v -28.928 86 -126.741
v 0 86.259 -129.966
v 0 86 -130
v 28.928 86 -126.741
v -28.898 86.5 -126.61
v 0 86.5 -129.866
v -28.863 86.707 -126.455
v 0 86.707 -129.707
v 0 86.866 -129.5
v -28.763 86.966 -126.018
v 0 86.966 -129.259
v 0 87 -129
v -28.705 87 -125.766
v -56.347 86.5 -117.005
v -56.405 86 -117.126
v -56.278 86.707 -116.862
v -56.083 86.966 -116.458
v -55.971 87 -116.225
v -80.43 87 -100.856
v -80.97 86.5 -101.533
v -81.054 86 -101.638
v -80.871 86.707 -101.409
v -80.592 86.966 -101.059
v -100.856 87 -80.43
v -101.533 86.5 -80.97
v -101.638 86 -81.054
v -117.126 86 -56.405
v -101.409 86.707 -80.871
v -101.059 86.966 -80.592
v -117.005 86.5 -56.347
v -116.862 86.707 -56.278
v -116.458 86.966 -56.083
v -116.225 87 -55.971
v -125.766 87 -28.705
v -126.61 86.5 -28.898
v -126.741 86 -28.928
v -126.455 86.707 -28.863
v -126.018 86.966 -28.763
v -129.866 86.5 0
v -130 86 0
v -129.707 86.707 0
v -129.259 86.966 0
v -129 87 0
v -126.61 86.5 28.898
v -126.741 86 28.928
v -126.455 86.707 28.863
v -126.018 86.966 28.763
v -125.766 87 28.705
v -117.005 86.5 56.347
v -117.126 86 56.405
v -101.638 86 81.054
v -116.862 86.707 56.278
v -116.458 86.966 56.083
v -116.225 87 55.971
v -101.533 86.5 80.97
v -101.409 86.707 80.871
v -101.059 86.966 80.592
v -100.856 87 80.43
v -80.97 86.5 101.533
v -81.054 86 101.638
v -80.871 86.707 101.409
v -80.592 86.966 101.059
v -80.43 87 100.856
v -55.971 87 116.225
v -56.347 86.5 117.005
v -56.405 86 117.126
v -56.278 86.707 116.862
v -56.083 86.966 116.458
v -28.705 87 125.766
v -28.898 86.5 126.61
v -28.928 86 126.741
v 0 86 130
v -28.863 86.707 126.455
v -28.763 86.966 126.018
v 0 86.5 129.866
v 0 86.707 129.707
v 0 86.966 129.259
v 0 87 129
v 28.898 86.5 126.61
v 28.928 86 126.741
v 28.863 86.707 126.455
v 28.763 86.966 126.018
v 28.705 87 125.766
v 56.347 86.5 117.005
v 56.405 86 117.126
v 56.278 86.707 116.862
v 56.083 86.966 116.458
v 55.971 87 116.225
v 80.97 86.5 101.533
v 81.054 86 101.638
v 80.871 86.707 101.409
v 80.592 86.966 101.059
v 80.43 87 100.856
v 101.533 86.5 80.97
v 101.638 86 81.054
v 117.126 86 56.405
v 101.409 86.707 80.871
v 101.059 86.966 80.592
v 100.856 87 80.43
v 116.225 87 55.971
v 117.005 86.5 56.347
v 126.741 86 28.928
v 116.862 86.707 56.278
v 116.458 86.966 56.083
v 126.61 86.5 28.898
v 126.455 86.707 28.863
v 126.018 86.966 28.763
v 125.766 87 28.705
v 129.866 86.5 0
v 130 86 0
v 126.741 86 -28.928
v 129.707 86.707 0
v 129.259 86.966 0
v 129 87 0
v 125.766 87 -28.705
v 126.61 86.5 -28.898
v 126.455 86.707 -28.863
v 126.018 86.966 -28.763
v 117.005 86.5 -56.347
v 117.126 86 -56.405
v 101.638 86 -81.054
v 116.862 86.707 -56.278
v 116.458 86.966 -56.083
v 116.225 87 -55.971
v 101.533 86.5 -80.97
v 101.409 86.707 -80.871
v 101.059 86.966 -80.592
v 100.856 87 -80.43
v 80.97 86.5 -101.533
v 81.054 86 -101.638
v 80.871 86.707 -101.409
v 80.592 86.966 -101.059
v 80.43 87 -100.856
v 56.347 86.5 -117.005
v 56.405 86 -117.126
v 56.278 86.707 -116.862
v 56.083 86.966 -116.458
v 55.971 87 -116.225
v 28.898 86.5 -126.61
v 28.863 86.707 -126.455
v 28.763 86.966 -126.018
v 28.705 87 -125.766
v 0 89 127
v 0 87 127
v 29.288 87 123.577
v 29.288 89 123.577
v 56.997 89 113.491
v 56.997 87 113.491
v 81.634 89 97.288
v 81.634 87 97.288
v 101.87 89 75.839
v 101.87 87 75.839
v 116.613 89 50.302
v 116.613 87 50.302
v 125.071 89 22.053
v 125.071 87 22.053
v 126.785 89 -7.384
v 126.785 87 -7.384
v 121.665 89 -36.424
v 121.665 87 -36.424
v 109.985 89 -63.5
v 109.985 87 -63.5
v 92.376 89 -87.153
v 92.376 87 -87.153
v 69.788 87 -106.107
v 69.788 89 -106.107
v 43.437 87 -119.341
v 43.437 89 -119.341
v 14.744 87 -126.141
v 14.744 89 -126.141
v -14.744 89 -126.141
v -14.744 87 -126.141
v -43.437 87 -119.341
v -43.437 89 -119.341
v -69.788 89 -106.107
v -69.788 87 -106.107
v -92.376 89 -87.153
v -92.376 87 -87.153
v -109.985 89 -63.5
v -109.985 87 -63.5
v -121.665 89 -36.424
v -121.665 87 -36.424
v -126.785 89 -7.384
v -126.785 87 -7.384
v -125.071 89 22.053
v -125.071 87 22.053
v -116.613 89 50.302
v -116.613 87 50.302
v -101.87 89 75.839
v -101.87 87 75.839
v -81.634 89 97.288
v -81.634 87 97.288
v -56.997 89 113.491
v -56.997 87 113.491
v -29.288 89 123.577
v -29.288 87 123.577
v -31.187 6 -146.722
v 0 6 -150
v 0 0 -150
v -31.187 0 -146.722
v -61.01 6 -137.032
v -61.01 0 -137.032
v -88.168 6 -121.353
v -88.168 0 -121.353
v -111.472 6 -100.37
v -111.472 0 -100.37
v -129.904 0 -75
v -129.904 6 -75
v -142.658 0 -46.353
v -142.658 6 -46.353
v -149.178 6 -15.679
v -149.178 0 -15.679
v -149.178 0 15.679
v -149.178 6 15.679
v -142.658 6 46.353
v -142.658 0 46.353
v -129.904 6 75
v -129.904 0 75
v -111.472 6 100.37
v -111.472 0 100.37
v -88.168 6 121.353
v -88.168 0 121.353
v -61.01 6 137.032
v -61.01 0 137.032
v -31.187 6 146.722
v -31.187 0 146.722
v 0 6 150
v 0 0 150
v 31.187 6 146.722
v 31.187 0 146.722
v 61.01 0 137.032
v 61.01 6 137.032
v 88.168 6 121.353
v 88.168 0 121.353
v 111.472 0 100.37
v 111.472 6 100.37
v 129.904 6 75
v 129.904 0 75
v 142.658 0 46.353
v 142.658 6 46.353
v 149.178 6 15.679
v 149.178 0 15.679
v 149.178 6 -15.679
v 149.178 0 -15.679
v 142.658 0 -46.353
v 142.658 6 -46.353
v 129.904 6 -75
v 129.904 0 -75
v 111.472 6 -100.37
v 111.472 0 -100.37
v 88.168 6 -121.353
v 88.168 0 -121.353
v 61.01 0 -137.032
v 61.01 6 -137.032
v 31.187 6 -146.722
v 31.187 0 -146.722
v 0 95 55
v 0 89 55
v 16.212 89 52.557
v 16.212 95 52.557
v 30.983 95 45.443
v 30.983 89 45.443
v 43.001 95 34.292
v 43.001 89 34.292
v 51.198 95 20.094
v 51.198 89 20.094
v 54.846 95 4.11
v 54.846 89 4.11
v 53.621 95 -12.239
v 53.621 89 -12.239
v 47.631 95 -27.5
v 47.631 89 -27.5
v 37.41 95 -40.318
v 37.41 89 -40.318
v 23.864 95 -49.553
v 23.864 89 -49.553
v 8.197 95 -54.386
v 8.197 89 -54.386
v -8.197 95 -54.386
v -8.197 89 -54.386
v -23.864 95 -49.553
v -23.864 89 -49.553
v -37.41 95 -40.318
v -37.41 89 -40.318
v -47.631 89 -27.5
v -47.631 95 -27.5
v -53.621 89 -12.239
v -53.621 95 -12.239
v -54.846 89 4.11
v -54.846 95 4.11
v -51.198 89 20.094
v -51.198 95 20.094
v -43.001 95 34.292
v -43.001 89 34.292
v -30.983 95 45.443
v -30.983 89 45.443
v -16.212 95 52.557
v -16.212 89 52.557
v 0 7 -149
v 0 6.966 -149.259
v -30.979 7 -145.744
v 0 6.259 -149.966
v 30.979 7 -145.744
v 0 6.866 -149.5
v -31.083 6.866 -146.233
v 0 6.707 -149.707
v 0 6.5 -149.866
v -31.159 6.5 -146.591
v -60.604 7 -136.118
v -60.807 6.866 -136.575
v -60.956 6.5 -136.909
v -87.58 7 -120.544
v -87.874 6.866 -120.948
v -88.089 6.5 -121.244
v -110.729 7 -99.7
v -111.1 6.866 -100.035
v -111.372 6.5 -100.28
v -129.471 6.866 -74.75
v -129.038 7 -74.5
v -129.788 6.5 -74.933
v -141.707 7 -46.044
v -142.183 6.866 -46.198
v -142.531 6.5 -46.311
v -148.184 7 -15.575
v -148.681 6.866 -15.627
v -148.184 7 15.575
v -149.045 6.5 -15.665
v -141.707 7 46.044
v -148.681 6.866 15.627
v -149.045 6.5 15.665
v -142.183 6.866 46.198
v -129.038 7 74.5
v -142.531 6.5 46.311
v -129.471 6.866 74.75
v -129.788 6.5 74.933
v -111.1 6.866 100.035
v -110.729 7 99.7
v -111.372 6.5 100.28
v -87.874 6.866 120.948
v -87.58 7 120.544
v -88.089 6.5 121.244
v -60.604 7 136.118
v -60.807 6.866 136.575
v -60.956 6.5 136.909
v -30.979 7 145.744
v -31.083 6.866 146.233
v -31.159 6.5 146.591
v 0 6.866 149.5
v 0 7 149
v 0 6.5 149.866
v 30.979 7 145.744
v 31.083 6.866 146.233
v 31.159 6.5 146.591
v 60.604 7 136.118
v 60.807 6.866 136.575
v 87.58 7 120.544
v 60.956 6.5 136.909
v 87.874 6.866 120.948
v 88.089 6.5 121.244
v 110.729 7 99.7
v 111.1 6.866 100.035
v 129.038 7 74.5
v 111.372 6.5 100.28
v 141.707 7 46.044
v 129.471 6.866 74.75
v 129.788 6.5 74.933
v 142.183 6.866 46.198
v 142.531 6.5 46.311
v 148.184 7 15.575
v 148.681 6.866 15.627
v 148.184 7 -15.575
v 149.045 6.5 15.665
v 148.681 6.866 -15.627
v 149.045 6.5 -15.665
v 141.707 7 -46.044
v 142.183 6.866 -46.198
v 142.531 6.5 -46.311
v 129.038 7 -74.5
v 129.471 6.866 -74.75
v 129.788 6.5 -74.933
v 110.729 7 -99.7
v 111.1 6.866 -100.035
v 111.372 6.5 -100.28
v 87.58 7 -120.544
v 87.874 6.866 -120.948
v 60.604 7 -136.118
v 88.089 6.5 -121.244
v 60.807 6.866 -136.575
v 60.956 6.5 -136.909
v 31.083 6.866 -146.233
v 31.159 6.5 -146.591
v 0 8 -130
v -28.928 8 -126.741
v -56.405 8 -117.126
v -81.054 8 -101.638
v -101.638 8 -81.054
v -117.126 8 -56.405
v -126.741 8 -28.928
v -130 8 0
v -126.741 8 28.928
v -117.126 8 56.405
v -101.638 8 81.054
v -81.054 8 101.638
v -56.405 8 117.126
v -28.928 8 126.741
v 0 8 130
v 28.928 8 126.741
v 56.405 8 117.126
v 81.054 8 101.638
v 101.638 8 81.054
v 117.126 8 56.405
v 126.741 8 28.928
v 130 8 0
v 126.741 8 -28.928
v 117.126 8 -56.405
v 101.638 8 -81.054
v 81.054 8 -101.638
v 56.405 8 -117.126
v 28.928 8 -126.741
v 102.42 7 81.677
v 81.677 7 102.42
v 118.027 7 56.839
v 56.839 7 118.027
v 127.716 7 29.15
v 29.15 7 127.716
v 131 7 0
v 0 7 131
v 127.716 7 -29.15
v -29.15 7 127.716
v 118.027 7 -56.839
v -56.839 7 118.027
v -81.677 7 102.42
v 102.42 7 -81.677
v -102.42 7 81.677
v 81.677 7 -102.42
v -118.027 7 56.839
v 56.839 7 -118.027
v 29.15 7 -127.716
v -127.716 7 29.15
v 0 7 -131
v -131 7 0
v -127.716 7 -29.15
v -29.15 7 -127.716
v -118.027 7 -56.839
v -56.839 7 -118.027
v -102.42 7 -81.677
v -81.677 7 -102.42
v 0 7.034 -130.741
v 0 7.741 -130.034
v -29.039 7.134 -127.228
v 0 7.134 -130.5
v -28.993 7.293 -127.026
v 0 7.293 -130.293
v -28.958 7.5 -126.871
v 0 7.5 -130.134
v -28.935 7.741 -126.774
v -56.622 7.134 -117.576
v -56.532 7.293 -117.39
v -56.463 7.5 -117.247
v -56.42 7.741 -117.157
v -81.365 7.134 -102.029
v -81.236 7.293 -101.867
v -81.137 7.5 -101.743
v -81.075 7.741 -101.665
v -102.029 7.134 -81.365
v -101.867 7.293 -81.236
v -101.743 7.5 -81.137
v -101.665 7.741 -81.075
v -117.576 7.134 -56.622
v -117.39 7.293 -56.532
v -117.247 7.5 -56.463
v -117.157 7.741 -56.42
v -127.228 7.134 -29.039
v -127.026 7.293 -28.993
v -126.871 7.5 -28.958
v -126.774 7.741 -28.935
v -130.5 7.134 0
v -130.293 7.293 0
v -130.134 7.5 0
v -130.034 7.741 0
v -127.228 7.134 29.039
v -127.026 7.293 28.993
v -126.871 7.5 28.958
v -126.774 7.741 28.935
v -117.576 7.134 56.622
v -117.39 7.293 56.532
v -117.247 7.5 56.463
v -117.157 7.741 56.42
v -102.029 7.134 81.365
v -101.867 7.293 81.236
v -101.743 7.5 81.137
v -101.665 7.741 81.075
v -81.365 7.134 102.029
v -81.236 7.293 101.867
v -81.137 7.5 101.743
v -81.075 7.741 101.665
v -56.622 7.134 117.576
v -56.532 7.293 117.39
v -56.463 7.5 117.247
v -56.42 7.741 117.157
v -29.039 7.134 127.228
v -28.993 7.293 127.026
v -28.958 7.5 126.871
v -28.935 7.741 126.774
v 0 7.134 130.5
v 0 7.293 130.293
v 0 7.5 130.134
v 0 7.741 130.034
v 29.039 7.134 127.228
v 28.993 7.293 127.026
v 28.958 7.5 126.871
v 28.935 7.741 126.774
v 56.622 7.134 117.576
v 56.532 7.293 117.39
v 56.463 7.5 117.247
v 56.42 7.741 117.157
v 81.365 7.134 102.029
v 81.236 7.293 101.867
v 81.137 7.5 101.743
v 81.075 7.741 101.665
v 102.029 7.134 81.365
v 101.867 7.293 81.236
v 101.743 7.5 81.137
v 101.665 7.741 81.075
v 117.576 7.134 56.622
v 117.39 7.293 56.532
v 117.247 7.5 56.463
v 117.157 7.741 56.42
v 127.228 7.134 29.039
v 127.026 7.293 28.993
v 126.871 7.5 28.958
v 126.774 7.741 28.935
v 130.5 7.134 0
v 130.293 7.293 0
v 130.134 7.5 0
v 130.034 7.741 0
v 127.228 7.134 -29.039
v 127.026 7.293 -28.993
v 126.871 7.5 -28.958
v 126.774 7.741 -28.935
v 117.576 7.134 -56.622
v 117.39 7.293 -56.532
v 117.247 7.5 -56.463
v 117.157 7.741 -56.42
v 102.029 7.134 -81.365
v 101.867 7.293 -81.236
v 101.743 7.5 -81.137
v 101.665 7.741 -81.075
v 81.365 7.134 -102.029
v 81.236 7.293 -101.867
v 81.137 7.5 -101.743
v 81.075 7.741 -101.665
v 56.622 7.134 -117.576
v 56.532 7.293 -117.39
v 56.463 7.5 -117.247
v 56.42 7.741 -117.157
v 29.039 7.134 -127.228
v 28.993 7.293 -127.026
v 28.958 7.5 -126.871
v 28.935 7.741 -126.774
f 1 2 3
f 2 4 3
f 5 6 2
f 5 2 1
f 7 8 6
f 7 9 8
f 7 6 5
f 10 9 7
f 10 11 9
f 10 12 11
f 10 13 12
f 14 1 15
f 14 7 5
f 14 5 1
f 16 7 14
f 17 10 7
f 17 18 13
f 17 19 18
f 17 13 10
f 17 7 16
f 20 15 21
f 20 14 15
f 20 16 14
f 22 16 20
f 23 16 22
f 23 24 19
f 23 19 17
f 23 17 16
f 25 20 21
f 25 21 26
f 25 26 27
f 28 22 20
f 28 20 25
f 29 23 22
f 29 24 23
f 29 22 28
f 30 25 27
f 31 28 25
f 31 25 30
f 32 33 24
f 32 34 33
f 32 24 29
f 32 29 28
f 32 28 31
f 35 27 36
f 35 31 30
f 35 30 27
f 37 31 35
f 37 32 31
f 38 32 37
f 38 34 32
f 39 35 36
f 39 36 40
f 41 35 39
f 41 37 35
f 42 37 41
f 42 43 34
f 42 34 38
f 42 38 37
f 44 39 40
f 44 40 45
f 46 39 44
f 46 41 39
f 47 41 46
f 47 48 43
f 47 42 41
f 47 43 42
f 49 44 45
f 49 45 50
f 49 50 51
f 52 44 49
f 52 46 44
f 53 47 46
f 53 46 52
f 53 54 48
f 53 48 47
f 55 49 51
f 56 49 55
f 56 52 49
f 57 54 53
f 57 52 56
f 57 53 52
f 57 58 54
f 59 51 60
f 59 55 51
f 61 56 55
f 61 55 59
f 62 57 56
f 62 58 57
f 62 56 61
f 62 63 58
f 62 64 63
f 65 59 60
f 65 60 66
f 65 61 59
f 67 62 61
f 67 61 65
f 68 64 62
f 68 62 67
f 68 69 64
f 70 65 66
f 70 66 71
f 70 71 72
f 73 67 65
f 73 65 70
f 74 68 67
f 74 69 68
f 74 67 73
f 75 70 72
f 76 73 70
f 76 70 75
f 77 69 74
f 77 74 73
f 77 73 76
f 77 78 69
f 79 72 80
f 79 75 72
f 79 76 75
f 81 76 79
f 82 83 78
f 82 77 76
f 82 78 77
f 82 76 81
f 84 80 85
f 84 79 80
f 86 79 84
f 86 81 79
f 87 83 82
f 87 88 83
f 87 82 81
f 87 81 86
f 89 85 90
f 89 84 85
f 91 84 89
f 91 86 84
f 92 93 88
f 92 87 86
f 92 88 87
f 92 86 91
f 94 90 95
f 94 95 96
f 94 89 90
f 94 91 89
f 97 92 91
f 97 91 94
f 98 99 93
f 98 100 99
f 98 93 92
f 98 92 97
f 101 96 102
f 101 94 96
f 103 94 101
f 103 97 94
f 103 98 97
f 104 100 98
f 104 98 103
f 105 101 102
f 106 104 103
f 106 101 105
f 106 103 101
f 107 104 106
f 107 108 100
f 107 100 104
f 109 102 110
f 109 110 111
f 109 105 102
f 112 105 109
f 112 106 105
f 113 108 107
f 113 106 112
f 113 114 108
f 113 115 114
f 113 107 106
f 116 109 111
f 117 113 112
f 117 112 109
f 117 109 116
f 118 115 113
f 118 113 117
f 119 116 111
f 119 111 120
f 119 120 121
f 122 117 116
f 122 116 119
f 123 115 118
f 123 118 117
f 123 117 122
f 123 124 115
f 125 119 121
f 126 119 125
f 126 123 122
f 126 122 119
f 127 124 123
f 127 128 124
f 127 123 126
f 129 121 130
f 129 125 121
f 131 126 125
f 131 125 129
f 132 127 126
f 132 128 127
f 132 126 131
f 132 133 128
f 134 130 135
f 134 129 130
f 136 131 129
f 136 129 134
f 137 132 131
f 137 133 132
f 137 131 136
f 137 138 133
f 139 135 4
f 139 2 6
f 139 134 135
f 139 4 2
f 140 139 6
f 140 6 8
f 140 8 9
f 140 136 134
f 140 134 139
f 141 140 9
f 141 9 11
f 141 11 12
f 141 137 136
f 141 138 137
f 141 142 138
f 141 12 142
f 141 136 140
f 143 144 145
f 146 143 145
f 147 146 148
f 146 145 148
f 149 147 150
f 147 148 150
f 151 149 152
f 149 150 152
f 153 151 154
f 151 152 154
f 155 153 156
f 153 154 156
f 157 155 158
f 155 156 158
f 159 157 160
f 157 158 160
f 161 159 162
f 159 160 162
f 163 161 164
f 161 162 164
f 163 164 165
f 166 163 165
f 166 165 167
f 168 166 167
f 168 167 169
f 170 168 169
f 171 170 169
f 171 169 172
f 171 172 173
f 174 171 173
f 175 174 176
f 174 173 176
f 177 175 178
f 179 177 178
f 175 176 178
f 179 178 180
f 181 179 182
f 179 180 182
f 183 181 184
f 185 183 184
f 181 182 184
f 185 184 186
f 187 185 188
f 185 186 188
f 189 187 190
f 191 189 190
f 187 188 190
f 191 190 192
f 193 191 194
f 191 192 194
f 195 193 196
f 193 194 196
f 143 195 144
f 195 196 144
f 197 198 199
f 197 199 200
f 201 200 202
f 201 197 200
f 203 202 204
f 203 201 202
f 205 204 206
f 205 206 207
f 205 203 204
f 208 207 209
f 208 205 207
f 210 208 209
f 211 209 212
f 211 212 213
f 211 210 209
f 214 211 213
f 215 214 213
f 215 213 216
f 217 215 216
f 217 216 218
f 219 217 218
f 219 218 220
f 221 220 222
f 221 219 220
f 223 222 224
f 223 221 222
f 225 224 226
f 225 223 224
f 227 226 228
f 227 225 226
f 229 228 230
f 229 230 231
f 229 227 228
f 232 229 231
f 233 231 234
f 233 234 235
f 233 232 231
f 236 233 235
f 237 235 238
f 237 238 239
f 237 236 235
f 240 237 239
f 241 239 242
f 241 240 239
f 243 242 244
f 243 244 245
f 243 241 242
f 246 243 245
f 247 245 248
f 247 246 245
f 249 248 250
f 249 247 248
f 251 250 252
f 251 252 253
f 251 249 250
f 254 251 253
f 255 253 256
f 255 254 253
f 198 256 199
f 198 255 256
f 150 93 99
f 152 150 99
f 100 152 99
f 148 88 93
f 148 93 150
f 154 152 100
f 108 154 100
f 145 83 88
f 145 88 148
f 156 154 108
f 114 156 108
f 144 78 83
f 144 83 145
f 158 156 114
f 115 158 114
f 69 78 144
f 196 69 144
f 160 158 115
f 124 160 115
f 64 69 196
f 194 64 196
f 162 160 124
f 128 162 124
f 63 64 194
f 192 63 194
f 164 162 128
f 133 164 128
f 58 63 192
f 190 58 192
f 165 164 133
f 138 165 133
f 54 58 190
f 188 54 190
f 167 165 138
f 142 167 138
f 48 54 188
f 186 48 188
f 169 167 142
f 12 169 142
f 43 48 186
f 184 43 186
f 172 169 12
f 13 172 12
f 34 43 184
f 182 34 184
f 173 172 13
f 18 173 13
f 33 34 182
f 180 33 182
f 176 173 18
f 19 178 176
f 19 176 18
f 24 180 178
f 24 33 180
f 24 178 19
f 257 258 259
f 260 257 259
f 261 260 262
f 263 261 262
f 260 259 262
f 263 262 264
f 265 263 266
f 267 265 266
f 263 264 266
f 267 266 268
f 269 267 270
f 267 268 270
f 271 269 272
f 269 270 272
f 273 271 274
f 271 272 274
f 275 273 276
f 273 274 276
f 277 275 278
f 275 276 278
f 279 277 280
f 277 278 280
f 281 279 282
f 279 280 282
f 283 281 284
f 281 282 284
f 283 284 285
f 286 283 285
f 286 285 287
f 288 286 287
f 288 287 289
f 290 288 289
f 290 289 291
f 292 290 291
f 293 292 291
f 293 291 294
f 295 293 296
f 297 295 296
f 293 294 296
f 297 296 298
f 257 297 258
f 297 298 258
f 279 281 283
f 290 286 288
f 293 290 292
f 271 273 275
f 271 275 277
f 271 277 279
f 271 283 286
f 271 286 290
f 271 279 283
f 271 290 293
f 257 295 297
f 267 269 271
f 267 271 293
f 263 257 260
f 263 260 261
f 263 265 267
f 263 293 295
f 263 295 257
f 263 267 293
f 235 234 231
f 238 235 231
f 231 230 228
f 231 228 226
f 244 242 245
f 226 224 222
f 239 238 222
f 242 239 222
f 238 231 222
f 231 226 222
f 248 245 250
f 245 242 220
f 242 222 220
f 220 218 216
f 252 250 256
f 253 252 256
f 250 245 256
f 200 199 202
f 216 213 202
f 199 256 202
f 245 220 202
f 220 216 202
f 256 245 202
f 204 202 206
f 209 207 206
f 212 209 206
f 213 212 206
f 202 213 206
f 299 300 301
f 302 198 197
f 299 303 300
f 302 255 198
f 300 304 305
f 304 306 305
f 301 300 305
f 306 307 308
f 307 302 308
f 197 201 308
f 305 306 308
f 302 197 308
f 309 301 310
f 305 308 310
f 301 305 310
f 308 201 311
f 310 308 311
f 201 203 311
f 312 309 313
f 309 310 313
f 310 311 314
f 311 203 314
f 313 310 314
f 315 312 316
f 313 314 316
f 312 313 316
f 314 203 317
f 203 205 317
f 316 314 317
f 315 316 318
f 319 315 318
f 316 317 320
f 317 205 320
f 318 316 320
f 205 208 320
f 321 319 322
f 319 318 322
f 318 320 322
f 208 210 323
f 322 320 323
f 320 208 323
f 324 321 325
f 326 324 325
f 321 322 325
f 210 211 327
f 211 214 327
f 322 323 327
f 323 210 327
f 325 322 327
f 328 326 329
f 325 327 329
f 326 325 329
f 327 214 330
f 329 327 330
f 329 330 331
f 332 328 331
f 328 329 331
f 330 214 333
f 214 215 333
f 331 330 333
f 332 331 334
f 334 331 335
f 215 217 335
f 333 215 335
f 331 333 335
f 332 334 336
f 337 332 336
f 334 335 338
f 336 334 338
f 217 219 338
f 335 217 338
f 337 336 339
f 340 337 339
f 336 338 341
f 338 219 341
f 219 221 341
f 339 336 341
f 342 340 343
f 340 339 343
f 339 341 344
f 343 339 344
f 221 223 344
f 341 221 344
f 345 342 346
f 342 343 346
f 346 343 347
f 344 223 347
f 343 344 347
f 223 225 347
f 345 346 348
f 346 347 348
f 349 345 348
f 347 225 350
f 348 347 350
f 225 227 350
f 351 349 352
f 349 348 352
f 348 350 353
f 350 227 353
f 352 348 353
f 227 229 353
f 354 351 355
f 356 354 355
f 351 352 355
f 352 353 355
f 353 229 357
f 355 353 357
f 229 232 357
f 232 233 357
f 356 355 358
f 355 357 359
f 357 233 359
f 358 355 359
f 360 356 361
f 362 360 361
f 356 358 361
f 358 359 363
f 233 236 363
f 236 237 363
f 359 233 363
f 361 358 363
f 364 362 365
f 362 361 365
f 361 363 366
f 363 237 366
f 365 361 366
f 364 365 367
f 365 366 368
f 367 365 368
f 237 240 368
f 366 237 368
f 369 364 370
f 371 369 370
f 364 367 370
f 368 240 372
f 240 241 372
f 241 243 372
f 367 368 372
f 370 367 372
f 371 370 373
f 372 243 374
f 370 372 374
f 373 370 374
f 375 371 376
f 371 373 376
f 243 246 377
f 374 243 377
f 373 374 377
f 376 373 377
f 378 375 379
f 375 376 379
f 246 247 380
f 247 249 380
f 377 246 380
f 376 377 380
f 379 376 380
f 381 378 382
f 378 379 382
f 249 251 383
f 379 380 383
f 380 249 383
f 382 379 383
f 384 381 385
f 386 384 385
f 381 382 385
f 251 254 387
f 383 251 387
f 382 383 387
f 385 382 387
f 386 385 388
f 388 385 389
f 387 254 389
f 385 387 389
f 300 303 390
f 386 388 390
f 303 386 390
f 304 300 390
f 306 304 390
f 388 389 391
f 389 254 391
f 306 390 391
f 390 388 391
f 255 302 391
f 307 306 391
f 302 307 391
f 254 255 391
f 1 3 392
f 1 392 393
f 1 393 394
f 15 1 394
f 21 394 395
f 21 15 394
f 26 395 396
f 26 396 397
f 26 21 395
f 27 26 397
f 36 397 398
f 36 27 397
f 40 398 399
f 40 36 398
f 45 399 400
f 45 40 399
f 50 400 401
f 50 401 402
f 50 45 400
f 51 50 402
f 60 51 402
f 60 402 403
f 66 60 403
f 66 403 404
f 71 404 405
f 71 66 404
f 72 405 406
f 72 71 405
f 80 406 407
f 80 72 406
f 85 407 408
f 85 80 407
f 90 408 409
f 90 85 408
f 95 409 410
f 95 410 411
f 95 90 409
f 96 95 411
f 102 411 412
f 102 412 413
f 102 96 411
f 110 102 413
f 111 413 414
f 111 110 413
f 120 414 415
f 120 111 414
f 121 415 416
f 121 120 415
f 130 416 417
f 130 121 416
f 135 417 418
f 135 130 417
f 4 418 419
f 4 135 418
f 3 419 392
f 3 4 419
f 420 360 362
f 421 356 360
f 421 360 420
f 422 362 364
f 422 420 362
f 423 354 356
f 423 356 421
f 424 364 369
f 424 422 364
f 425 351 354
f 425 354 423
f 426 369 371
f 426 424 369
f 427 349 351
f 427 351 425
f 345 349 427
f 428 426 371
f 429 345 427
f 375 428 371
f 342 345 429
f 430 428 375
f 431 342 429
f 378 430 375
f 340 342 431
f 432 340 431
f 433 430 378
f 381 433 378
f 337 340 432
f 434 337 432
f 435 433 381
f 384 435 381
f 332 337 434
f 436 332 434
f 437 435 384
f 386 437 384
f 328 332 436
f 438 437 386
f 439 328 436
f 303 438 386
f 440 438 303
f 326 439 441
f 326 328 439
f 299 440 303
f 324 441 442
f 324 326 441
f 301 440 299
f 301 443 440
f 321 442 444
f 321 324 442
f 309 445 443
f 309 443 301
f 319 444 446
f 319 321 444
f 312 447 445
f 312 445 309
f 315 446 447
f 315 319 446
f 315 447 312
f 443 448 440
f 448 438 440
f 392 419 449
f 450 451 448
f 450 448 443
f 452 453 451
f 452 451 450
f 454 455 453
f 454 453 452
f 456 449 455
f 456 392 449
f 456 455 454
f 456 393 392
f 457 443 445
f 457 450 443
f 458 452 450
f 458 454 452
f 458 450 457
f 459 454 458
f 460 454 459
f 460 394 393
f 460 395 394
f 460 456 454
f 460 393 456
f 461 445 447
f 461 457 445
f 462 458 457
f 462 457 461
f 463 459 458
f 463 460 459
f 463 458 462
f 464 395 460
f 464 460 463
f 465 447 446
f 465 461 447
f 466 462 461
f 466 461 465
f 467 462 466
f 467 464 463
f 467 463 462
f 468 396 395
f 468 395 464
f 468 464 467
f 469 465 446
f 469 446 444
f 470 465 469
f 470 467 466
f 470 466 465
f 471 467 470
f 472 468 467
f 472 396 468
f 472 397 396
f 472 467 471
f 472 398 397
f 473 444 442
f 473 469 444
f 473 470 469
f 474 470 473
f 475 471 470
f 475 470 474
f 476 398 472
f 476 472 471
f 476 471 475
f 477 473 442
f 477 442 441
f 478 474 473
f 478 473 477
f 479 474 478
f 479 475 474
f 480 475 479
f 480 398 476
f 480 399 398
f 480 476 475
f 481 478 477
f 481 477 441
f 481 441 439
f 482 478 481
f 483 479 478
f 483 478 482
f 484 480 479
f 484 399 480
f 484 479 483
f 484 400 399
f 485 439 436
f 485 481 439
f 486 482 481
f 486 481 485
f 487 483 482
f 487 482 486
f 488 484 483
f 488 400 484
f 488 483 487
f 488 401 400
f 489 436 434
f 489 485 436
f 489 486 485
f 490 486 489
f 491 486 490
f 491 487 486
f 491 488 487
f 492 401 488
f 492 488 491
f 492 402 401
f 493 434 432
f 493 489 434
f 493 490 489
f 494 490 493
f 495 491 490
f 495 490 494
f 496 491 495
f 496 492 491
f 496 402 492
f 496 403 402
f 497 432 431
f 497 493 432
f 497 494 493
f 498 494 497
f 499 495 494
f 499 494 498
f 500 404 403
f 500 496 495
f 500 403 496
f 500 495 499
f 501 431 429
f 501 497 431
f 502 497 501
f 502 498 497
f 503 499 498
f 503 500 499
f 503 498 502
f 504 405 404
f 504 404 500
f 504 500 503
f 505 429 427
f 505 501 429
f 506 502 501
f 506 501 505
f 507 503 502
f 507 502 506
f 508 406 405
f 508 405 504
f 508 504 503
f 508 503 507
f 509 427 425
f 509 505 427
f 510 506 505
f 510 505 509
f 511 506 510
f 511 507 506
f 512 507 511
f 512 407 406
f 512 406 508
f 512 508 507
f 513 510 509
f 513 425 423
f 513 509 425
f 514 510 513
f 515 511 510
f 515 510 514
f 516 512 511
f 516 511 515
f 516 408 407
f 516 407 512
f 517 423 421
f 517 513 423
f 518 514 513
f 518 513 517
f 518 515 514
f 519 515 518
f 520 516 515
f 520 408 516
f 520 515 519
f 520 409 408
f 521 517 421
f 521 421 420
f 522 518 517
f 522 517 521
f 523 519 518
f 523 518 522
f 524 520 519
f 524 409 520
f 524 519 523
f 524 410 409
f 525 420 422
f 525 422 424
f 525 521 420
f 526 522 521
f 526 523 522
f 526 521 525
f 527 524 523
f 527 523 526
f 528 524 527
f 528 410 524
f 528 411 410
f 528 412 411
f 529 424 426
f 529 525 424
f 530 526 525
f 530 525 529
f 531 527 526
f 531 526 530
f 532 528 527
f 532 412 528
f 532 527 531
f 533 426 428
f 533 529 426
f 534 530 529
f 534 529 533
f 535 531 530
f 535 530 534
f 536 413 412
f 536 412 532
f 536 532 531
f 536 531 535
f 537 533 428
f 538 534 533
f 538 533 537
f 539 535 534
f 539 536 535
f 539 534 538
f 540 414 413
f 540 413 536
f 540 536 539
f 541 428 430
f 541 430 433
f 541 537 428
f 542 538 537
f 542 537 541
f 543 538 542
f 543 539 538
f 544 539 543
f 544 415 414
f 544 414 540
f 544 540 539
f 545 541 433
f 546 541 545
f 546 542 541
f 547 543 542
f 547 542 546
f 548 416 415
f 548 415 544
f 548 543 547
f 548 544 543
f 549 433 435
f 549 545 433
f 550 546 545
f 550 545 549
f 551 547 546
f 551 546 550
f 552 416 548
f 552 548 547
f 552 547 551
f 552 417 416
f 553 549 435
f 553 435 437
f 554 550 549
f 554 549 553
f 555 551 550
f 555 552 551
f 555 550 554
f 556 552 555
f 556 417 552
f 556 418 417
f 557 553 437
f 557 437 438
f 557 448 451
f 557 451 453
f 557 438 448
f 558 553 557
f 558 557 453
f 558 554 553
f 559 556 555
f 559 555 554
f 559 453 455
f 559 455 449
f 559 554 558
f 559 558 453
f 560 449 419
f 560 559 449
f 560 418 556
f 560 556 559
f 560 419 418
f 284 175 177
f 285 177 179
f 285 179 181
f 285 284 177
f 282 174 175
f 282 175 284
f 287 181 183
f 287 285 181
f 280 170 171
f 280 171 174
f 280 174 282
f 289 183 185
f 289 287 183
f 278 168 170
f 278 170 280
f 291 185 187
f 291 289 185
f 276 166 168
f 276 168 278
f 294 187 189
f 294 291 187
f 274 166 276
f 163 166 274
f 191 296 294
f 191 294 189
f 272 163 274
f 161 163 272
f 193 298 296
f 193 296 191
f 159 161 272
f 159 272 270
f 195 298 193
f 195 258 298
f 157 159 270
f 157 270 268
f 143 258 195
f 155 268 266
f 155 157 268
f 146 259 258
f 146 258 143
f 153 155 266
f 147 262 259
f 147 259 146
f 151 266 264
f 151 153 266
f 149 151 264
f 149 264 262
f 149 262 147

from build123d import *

# Parameters (mm, degrees)
IZIM2_W                     = 150
IZIM2_H                     = 7
IZIM2_W_2                   = 130
IZIM2_H_2                   = 80
IZIM3_R                     = 127
Y_KSEKLIK_EKSTR_ZYON1_DEPTH = 2
RADYUS1_R                   = 1
RADYUS2_R                   = 1
IZIM5_R                     = 55
Y_KSEKLIK_EKSTR_ZYON2_DEPTH = 6


with BuildPart() as part:
    # Çizim2 → Döndür1 (revolve)
    with BuildSketch(Plane.XY, mode=Mode.PRIVATE) as d_nd_r1_sk:
        with Locations((-75, 3.5)):
            Rectangle(IZIM2_W, IZIM2_H)
        with Locations((-65, 47)):
            Rectangle(IZIM2_W_2, IZIM2_H_2)
    revolve(d_nd_r1_sk.sketch.rotate(Axis((0, 7, 0), (0, 1, 0)), 270), axis=Axis((0, 7, 0), (0, 1, 0)))

    # Çizim3 → Yükseklik-Ekstrüzyon1 (add)
    with BuildSketch(Plane(origin=(0, 87, 0), x_dir=(1, 0, 0), z_dir=(0, 1, 0))):
        with Locations(Location((0, 0, 0), (0, 0, 270))):
            Circle(IZIM3_R)
    extrude(amount=Y_KSEKLIK_EKSTR_ZYON1_DEPTH)

    # Radyus1
    radyus1_edges = [part.edges().sort_by_distance(p)[0] for p in [
        (0, 87, 130),
        (0, 7, 130),
    ]]
    fillet(radyus1_edges, radius=RADYUS1_R)

    # Radyus2
    radyus2_edges = [part.edges().sort_by_distance(p)[0] for p in [
        (0, 7, 150),
    ]]
    fillet(radyus2_edges, radius=RADYUS2_R)

    # Çizim5 → Yükseklik-Ekstrüzyon2 (add)
    with BuildSketch(Plane(origin=(0, 89, 0), x_dir=(1, 0, 0), z_dir=(0, 1, 0))):
        with Locations(Location((0, 0, 0), (0, 0, 270))):
            Circle(IZIM5_R)
    extrude(amount=Y_KSEKLIK_EKSTR_ZYON2_DEPTH)


solid = part.part
